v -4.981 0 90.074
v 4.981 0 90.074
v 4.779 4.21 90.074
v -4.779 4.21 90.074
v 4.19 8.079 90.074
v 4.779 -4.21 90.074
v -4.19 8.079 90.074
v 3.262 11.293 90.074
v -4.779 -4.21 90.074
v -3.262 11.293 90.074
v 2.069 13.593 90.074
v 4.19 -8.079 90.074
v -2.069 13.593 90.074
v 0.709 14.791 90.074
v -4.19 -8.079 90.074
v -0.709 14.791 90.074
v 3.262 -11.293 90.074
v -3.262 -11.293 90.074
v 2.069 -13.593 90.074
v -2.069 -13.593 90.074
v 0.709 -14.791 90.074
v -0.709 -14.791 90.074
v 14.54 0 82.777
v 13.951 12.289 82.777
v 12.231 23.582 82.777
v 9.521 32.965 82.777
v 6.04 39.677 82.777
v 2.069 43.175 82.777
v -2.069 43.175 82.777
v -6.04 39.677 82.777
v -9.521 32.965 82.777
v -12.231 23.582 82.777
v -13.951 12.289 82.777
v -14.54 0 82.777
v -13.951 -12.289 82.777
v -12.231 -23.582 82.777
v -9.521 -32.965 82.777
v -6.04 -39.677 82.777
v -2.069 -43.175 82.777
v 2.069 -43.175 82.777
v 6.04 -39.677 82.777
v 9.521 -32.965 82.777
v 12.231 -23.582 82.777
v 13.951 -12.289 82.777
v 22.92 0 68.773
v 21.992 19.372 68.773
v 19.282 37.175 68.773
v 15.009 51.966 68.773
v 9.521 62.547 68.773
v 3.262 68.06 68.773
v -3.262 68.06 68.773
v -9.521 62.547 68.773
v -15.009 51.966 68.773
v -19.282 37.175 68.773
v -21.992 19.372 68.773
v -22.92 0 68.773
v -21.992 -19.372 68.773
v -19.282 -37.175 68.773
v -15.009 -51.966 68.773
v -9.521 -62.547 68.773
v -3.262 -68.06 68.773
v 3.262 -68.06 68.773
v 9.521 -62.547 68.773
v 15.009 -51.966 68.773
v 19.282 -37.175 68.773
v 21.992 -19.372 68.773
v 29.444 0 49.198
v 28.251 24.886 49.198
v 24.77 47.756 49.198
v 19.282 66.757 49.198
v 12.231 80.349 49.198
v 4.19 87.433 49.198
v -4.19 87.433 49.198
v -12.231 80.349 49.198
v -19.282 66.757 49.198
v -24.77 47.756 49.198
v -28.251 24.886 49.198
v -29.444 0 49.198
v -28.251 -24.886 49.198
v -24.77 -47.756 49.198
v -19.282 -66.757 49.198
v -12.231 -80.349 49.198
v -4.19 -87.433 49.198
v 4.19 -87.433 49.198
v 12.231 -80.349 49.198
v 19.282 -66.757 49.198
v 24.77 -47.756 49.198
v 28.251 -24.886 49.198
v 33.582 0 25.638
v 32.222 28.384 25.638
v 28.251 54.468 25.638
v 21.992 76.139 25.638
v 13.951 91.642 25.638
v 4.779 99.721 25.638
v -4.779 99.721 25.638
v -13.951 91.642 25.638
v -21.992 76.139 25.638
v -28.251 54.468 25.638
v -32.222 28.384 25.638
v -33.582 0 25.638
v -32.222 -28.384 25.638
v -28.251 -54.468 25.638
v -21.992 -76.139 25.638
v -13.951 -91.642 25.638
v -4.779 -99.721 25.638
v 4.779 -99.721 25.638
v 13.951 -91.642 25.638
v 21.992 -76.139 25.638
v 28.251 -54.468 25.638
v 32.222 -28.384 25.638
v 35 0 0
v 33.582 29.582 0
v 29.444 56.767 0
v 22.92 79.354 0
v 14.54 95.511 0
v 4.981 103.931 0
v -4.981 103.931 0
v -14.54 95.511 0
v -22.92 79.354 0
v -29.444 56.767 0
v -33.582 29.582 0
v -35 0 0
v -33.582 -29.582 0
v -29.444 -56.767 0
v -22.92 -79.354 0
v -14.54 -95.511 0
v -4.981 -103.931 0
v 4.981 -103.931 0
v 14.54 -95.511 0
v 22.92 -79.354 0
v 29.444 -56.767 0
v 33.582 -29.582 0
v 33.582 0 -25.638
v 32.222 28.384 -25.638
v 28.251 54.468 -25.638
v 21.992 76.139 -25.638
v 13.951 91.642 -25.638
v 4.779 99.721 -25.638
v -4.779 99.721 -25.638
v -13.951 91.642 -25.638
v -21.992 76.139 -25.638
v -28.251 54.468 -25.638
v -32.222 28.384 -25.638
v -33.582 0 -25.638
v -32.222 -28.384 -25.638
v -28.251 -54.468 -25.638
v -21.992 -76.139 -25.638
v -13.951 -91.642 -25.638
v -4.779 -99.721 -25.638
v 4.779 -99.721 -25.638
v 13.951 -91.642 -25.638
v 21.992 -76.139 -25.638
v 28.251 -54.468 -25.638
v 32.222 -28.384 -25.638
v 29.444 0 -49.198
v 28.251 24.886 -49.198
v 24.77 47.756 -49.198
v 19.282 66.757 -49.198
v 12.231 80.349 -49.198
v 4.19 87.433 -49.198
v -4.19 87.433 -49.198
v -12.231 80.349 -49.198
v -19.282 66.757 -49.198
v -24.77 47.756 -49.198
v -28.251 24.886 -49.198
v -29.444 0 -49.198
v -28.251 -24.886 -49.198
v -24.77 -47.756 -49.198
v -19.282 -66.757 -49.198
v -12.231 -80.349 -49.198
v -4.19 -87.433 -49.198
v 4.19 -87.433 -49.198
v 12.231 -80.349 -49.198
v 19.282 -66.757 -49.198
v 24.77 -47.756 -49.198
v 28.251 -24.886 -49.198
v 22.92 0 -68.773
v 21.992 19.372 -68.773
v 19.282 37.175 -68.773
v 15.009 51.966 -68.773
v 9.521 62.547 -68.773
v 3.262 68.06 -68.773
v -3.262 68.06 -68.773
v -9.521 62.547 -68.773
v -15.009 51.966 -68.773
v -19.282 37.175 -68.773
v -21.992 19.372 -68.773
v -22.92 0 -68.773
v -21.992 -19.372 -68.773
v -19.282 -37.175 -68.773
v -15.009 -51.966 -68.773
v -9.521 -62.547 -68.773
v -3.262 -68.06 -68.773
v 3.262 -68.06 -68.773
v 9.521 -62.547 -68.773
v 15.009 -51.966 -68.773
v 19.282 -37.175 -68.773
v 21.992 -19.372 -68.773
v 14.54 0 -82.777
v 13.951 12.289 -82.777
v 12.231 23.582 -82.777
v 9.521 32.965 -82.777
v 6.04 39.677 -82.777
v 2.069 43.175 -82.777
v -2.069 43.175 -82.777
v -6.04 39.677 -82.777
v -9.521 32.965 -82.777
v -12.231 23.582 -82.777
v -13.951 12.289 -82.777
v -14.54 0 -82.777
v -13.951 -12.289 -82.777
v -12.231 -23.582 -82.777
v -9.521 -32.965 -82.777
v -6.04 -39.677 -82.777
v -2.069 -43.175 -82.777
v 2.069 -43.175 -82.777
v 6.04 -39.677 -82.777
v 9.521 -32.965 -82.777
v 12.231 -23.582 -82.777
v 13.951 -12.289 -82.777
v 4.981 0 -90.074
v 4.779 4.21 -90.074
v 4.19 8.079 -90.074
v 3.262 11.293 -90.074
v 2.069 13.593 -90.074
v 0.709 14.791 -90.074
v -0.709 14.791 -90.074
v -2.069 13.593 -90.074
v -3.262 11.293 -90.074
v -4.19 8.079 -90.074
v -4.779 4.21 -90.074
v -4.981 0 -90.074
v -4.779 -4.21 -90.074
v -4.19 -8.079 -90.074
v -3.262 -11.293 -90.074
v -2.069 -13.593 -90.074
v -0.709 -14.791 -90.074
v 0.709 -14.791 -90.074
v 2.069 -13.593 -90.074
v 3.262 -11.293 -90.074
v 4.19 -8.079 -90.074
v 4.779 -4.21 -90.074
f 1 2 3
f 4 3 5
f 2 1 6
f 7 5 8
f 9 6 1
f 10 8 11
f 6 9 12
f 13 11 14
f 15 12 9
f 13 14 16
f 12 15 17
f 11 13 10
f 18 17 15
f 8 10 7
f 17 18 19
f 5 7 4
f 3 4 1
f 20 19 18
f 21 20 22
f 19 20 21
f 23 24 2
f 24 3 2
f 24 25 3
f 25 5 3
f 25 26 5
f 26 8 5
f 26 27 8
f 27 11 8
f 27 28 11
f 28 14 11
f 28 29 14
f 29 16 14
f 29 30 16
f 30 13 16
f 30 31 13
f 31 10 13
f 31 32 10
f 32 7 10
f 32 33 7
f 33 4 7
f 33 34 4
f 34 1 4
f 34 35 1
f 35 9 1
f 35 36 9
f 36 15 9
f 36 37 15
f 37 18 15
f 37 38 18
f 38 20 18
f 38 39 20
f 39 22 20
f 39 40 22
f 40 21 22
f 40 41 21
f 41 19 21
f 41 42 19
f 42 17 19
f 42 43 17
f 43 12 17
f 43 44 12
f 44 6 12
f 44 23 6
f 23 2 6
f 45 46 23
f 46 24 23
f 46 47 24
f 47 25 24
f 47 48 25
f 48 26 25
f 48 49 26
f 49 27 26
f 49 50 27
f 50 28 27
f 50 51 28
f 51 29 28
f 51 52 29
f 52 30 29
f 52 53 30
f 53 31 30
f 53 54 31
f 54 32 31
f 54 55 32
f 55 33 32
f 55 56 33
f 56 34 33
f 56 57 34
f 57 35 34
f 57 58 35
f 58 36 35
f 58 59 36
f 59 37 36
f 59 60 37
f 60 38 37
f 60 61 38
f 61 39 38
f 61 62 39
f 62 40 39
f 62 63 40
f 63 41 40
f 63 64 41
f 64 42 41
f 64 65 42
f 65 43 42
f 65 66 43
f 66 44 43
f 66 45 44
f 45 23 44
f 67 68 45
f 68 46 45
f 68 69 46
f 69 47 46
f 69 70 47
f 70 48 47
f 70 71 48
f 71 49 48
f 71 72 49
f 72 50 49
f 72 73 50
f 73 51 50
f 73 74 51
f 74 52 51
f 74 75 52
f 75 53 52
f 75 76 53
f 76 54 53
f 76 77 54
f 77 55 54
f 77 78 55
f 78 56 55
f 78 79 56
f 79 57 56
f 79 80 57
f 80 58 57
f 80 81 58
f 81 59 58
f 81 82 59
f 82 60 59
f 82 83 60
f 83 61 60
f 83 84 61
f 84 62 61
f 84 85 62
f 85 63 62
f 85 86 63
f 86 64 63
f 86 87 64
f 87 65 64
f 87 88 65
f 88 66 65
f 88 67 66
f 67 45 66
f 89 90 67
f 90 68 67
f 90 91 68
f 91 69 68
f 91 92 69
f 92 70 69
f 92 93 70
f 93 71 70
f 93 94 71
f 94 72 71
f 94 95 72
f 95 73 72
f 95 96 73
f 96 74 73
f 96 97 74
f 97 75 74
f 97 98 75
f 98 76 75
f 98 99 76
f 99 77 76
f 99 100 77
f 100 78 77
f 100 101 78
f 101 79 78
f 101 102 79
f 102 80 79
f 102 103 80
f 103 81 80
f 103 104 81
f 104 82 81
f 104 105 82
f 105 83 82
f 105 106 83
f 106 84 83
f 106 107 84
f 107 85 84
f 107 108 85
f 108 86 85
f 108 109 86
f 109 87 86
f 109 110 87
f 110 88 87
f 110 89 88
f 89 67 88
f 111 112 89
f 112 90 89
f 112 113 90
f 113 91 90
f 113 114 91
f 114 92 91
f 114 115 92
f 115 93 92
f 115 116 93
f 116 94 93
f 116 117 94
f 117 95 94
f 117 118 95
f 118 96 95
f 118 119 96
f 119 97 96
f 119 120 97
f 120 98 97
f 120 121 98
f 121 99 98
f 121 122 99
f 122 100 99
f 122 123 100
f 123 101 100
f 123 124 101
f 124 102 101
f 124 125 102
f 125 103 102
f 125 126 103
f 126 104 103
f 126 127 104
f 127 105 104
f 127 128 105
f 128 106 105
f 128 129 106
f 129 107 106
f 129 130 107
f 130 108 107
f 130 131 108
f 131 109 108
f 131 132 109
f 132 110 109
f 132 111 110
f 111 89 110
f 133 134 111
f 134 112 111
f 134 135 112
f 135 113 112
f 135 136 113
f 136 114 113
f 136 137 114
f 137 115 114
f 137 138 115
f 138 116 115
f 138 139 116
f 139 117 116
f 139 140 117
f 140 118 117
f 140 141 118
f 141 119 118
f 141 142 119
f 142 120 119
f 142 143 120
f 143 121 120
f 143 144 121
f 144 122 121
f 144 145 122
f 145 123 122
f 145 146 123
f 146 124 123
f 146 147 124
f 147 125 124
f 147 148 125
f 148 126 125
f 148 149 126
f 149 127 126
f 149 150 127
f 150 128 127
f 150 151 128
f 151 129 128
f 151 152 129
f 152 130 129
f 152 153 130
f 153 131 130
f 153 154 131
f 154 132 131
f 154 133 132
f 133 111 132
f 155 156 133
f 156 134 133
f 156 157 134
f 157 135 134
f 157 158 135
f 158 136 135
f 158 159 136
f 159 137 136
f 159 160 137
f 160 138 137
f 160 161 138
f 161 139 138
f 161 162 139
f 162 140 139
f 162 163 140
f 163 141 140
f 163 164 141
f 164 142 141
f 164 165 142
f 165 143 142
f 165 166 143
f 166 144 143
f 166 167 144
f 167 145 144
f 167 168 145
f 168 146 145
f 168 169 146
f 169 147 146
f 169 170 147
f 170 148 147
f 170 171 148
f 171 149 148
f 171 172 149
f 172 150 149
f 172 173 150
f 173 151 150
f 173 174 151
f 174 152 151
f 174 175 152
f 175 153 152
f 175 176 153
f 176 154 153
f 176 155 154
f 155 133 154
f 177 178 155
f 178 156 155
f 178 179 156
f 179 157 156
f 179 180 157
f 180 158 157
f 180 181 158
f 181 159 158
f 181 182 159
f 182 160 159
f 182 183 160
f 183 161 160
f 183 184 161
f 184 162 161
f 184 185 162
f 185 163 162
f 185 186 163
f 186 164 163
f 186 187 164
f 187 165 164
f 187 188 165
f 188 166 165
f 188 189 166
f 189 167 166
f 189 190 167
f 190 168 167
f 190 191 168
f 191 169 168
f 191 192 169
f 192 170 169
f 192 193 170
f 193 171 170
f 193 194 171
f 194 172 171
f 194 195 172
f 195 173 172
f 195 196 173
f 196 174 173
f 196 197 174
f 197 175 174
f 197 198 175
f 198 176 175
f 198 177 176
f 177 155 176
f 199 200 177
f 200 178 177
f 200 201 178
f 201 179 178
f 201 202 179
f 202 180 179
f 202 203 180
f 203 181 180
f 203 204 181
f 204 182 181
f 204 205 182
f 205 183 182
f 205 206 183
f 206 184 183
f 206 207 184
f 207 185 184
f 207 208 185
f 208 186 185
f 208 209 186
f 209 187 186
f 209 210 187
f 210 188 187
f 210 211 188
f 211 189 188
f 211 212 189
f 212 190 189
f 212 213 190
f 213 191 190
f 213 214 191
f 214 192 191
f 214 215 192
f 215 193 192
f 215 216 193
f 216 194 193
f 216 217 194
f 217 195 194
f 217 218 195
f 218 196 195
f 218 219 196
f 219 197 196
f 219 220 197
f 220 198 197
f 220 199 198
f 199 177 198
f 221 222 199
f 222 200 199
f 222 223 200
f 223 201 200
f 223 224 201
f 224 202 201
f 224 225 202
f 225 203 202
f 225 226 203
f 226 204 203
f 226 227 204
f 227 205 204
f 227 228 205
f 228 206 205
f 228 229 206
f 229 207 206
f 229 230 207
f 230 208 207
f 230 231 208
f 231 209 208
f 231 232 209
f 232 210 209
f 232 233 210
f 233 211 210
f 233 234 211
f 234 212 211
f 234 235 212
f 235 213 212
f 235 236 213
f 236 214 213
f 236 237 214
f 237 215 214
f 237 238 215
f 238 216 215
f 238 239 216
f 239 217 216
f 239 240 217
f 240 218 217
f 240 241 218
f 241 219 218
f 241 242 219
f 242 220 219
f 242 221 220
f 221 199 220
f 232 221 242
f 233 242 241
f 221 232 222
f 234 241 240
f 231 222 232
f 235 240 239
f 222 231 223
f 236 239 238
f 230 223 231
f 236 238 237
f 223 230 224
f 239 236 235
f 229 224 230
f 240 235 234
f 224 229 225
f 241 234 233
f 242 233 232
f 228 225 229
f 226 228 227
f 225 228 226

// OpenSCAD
// Generated by SolidPython 1.0.1 on 2020-07-29 00:46:46


scale(v = [5, 15, 13]) {
	sphere(r = 7);
}
/***********************************************
*********      SolidPython code:      **********
************************************************
 
# import packages: SolidPython
from solid import *
from solid.utils import *
from itertools import chain, combinations, permutations


class Resize:

    def __init__(self, scad_file):
        self.scad_file = scad_file
        #self.scad_file = import_scad(scad_file)
        # cone/cylinder param:
        self.r1 = 0
        self.r2 = 0
        self.h = 0
        # rectangular prism param:
        self.w = 0
        self.l = 0
        # ellipse param:
        self.r = 0

    # import OpenScad code (file name corresponds to shape)


    # classify shape + parameters
    def assign(self, param1, param2, param3):
        if self.scad_file == 'cone.scad':
            self.r1 = param1
            self.r2 = param2
            self.h = param3
        elif self.scad_file == 'cylinder.scad':
            self.r1 = param1
            self.r2 = param2
            self.h = param3
        elif self.scad_file == 'rectangularPrism.scad':
            self.h = param1
            self.l = param2
            self.w = param3
        else:
            self.r = param1
            self.h = param2

    # resize parameters
    def iterate(self):
        x = range(3, 20, 2)
        i = 1
        if self.scad_file == 'cone.scad':
            tempList = list(permutations(x, 2))
            for temp in tempList:
                param1 = temp[0]
                param2 = temp[1]
                filepath = 'produced_scad_files/' + 'cone' + str(param1) + '_' + str(param2) + '_' + '.scad'
                scad_render_to_file(cylinder(h=param1, r1=param2, r2=0), filepath)

        elif self.scad_file == 'cylinder.scad':
            tempList = list(permutations(x, 3))
            for temp in tempList:
                param1 = temp[0]
                param2 = temp[1]
                filepath = 'produced_scad_files/' + 'cylinder' + str(param1) + '_' + str(param2) + '_' + '.scad'
                scad_render_to_file(cylinder(h=param1, r1=param2, r2=param2), filepath)

        elif self.scad_file == 'rectangularPrism.scad':
            tempList = list(permutations(x, 3))
            for temp in tempList:
                param1 = temp[0]
                param2 = temp[1]
                param3 = temp[2]
                filepath = 'produced_scad_files/' + 'rectangularPrism' + str(param1) + '_' + str(param2) + '_' + str(
                    param3) + '.scad'
                scad_render_to_file(cube(size=(param1, param2, param3)), filepath)

        elif self.scad_file == 'ellipse.scad':
            tempList = list(permutations(x, 4))
            for temp in tempList:
                param1 = temp[0]
                param2 = temp[1]
                param3 = temp[2]
                param4 = temp[3]
                filepath = 'produced_scad_files/' + 'ellipse' + str(param1) + '_' + str(param2) + '_' + str(param3) + '_' + str(param4) + '.scad'
                scad_render_to_file(scale([param1, param2, param3])(sphere(r=param4)), filepath)

    def render_to_scadfile(self):
        scad_render_to_file(scad, 'example.scad') 
 
************************************************/
